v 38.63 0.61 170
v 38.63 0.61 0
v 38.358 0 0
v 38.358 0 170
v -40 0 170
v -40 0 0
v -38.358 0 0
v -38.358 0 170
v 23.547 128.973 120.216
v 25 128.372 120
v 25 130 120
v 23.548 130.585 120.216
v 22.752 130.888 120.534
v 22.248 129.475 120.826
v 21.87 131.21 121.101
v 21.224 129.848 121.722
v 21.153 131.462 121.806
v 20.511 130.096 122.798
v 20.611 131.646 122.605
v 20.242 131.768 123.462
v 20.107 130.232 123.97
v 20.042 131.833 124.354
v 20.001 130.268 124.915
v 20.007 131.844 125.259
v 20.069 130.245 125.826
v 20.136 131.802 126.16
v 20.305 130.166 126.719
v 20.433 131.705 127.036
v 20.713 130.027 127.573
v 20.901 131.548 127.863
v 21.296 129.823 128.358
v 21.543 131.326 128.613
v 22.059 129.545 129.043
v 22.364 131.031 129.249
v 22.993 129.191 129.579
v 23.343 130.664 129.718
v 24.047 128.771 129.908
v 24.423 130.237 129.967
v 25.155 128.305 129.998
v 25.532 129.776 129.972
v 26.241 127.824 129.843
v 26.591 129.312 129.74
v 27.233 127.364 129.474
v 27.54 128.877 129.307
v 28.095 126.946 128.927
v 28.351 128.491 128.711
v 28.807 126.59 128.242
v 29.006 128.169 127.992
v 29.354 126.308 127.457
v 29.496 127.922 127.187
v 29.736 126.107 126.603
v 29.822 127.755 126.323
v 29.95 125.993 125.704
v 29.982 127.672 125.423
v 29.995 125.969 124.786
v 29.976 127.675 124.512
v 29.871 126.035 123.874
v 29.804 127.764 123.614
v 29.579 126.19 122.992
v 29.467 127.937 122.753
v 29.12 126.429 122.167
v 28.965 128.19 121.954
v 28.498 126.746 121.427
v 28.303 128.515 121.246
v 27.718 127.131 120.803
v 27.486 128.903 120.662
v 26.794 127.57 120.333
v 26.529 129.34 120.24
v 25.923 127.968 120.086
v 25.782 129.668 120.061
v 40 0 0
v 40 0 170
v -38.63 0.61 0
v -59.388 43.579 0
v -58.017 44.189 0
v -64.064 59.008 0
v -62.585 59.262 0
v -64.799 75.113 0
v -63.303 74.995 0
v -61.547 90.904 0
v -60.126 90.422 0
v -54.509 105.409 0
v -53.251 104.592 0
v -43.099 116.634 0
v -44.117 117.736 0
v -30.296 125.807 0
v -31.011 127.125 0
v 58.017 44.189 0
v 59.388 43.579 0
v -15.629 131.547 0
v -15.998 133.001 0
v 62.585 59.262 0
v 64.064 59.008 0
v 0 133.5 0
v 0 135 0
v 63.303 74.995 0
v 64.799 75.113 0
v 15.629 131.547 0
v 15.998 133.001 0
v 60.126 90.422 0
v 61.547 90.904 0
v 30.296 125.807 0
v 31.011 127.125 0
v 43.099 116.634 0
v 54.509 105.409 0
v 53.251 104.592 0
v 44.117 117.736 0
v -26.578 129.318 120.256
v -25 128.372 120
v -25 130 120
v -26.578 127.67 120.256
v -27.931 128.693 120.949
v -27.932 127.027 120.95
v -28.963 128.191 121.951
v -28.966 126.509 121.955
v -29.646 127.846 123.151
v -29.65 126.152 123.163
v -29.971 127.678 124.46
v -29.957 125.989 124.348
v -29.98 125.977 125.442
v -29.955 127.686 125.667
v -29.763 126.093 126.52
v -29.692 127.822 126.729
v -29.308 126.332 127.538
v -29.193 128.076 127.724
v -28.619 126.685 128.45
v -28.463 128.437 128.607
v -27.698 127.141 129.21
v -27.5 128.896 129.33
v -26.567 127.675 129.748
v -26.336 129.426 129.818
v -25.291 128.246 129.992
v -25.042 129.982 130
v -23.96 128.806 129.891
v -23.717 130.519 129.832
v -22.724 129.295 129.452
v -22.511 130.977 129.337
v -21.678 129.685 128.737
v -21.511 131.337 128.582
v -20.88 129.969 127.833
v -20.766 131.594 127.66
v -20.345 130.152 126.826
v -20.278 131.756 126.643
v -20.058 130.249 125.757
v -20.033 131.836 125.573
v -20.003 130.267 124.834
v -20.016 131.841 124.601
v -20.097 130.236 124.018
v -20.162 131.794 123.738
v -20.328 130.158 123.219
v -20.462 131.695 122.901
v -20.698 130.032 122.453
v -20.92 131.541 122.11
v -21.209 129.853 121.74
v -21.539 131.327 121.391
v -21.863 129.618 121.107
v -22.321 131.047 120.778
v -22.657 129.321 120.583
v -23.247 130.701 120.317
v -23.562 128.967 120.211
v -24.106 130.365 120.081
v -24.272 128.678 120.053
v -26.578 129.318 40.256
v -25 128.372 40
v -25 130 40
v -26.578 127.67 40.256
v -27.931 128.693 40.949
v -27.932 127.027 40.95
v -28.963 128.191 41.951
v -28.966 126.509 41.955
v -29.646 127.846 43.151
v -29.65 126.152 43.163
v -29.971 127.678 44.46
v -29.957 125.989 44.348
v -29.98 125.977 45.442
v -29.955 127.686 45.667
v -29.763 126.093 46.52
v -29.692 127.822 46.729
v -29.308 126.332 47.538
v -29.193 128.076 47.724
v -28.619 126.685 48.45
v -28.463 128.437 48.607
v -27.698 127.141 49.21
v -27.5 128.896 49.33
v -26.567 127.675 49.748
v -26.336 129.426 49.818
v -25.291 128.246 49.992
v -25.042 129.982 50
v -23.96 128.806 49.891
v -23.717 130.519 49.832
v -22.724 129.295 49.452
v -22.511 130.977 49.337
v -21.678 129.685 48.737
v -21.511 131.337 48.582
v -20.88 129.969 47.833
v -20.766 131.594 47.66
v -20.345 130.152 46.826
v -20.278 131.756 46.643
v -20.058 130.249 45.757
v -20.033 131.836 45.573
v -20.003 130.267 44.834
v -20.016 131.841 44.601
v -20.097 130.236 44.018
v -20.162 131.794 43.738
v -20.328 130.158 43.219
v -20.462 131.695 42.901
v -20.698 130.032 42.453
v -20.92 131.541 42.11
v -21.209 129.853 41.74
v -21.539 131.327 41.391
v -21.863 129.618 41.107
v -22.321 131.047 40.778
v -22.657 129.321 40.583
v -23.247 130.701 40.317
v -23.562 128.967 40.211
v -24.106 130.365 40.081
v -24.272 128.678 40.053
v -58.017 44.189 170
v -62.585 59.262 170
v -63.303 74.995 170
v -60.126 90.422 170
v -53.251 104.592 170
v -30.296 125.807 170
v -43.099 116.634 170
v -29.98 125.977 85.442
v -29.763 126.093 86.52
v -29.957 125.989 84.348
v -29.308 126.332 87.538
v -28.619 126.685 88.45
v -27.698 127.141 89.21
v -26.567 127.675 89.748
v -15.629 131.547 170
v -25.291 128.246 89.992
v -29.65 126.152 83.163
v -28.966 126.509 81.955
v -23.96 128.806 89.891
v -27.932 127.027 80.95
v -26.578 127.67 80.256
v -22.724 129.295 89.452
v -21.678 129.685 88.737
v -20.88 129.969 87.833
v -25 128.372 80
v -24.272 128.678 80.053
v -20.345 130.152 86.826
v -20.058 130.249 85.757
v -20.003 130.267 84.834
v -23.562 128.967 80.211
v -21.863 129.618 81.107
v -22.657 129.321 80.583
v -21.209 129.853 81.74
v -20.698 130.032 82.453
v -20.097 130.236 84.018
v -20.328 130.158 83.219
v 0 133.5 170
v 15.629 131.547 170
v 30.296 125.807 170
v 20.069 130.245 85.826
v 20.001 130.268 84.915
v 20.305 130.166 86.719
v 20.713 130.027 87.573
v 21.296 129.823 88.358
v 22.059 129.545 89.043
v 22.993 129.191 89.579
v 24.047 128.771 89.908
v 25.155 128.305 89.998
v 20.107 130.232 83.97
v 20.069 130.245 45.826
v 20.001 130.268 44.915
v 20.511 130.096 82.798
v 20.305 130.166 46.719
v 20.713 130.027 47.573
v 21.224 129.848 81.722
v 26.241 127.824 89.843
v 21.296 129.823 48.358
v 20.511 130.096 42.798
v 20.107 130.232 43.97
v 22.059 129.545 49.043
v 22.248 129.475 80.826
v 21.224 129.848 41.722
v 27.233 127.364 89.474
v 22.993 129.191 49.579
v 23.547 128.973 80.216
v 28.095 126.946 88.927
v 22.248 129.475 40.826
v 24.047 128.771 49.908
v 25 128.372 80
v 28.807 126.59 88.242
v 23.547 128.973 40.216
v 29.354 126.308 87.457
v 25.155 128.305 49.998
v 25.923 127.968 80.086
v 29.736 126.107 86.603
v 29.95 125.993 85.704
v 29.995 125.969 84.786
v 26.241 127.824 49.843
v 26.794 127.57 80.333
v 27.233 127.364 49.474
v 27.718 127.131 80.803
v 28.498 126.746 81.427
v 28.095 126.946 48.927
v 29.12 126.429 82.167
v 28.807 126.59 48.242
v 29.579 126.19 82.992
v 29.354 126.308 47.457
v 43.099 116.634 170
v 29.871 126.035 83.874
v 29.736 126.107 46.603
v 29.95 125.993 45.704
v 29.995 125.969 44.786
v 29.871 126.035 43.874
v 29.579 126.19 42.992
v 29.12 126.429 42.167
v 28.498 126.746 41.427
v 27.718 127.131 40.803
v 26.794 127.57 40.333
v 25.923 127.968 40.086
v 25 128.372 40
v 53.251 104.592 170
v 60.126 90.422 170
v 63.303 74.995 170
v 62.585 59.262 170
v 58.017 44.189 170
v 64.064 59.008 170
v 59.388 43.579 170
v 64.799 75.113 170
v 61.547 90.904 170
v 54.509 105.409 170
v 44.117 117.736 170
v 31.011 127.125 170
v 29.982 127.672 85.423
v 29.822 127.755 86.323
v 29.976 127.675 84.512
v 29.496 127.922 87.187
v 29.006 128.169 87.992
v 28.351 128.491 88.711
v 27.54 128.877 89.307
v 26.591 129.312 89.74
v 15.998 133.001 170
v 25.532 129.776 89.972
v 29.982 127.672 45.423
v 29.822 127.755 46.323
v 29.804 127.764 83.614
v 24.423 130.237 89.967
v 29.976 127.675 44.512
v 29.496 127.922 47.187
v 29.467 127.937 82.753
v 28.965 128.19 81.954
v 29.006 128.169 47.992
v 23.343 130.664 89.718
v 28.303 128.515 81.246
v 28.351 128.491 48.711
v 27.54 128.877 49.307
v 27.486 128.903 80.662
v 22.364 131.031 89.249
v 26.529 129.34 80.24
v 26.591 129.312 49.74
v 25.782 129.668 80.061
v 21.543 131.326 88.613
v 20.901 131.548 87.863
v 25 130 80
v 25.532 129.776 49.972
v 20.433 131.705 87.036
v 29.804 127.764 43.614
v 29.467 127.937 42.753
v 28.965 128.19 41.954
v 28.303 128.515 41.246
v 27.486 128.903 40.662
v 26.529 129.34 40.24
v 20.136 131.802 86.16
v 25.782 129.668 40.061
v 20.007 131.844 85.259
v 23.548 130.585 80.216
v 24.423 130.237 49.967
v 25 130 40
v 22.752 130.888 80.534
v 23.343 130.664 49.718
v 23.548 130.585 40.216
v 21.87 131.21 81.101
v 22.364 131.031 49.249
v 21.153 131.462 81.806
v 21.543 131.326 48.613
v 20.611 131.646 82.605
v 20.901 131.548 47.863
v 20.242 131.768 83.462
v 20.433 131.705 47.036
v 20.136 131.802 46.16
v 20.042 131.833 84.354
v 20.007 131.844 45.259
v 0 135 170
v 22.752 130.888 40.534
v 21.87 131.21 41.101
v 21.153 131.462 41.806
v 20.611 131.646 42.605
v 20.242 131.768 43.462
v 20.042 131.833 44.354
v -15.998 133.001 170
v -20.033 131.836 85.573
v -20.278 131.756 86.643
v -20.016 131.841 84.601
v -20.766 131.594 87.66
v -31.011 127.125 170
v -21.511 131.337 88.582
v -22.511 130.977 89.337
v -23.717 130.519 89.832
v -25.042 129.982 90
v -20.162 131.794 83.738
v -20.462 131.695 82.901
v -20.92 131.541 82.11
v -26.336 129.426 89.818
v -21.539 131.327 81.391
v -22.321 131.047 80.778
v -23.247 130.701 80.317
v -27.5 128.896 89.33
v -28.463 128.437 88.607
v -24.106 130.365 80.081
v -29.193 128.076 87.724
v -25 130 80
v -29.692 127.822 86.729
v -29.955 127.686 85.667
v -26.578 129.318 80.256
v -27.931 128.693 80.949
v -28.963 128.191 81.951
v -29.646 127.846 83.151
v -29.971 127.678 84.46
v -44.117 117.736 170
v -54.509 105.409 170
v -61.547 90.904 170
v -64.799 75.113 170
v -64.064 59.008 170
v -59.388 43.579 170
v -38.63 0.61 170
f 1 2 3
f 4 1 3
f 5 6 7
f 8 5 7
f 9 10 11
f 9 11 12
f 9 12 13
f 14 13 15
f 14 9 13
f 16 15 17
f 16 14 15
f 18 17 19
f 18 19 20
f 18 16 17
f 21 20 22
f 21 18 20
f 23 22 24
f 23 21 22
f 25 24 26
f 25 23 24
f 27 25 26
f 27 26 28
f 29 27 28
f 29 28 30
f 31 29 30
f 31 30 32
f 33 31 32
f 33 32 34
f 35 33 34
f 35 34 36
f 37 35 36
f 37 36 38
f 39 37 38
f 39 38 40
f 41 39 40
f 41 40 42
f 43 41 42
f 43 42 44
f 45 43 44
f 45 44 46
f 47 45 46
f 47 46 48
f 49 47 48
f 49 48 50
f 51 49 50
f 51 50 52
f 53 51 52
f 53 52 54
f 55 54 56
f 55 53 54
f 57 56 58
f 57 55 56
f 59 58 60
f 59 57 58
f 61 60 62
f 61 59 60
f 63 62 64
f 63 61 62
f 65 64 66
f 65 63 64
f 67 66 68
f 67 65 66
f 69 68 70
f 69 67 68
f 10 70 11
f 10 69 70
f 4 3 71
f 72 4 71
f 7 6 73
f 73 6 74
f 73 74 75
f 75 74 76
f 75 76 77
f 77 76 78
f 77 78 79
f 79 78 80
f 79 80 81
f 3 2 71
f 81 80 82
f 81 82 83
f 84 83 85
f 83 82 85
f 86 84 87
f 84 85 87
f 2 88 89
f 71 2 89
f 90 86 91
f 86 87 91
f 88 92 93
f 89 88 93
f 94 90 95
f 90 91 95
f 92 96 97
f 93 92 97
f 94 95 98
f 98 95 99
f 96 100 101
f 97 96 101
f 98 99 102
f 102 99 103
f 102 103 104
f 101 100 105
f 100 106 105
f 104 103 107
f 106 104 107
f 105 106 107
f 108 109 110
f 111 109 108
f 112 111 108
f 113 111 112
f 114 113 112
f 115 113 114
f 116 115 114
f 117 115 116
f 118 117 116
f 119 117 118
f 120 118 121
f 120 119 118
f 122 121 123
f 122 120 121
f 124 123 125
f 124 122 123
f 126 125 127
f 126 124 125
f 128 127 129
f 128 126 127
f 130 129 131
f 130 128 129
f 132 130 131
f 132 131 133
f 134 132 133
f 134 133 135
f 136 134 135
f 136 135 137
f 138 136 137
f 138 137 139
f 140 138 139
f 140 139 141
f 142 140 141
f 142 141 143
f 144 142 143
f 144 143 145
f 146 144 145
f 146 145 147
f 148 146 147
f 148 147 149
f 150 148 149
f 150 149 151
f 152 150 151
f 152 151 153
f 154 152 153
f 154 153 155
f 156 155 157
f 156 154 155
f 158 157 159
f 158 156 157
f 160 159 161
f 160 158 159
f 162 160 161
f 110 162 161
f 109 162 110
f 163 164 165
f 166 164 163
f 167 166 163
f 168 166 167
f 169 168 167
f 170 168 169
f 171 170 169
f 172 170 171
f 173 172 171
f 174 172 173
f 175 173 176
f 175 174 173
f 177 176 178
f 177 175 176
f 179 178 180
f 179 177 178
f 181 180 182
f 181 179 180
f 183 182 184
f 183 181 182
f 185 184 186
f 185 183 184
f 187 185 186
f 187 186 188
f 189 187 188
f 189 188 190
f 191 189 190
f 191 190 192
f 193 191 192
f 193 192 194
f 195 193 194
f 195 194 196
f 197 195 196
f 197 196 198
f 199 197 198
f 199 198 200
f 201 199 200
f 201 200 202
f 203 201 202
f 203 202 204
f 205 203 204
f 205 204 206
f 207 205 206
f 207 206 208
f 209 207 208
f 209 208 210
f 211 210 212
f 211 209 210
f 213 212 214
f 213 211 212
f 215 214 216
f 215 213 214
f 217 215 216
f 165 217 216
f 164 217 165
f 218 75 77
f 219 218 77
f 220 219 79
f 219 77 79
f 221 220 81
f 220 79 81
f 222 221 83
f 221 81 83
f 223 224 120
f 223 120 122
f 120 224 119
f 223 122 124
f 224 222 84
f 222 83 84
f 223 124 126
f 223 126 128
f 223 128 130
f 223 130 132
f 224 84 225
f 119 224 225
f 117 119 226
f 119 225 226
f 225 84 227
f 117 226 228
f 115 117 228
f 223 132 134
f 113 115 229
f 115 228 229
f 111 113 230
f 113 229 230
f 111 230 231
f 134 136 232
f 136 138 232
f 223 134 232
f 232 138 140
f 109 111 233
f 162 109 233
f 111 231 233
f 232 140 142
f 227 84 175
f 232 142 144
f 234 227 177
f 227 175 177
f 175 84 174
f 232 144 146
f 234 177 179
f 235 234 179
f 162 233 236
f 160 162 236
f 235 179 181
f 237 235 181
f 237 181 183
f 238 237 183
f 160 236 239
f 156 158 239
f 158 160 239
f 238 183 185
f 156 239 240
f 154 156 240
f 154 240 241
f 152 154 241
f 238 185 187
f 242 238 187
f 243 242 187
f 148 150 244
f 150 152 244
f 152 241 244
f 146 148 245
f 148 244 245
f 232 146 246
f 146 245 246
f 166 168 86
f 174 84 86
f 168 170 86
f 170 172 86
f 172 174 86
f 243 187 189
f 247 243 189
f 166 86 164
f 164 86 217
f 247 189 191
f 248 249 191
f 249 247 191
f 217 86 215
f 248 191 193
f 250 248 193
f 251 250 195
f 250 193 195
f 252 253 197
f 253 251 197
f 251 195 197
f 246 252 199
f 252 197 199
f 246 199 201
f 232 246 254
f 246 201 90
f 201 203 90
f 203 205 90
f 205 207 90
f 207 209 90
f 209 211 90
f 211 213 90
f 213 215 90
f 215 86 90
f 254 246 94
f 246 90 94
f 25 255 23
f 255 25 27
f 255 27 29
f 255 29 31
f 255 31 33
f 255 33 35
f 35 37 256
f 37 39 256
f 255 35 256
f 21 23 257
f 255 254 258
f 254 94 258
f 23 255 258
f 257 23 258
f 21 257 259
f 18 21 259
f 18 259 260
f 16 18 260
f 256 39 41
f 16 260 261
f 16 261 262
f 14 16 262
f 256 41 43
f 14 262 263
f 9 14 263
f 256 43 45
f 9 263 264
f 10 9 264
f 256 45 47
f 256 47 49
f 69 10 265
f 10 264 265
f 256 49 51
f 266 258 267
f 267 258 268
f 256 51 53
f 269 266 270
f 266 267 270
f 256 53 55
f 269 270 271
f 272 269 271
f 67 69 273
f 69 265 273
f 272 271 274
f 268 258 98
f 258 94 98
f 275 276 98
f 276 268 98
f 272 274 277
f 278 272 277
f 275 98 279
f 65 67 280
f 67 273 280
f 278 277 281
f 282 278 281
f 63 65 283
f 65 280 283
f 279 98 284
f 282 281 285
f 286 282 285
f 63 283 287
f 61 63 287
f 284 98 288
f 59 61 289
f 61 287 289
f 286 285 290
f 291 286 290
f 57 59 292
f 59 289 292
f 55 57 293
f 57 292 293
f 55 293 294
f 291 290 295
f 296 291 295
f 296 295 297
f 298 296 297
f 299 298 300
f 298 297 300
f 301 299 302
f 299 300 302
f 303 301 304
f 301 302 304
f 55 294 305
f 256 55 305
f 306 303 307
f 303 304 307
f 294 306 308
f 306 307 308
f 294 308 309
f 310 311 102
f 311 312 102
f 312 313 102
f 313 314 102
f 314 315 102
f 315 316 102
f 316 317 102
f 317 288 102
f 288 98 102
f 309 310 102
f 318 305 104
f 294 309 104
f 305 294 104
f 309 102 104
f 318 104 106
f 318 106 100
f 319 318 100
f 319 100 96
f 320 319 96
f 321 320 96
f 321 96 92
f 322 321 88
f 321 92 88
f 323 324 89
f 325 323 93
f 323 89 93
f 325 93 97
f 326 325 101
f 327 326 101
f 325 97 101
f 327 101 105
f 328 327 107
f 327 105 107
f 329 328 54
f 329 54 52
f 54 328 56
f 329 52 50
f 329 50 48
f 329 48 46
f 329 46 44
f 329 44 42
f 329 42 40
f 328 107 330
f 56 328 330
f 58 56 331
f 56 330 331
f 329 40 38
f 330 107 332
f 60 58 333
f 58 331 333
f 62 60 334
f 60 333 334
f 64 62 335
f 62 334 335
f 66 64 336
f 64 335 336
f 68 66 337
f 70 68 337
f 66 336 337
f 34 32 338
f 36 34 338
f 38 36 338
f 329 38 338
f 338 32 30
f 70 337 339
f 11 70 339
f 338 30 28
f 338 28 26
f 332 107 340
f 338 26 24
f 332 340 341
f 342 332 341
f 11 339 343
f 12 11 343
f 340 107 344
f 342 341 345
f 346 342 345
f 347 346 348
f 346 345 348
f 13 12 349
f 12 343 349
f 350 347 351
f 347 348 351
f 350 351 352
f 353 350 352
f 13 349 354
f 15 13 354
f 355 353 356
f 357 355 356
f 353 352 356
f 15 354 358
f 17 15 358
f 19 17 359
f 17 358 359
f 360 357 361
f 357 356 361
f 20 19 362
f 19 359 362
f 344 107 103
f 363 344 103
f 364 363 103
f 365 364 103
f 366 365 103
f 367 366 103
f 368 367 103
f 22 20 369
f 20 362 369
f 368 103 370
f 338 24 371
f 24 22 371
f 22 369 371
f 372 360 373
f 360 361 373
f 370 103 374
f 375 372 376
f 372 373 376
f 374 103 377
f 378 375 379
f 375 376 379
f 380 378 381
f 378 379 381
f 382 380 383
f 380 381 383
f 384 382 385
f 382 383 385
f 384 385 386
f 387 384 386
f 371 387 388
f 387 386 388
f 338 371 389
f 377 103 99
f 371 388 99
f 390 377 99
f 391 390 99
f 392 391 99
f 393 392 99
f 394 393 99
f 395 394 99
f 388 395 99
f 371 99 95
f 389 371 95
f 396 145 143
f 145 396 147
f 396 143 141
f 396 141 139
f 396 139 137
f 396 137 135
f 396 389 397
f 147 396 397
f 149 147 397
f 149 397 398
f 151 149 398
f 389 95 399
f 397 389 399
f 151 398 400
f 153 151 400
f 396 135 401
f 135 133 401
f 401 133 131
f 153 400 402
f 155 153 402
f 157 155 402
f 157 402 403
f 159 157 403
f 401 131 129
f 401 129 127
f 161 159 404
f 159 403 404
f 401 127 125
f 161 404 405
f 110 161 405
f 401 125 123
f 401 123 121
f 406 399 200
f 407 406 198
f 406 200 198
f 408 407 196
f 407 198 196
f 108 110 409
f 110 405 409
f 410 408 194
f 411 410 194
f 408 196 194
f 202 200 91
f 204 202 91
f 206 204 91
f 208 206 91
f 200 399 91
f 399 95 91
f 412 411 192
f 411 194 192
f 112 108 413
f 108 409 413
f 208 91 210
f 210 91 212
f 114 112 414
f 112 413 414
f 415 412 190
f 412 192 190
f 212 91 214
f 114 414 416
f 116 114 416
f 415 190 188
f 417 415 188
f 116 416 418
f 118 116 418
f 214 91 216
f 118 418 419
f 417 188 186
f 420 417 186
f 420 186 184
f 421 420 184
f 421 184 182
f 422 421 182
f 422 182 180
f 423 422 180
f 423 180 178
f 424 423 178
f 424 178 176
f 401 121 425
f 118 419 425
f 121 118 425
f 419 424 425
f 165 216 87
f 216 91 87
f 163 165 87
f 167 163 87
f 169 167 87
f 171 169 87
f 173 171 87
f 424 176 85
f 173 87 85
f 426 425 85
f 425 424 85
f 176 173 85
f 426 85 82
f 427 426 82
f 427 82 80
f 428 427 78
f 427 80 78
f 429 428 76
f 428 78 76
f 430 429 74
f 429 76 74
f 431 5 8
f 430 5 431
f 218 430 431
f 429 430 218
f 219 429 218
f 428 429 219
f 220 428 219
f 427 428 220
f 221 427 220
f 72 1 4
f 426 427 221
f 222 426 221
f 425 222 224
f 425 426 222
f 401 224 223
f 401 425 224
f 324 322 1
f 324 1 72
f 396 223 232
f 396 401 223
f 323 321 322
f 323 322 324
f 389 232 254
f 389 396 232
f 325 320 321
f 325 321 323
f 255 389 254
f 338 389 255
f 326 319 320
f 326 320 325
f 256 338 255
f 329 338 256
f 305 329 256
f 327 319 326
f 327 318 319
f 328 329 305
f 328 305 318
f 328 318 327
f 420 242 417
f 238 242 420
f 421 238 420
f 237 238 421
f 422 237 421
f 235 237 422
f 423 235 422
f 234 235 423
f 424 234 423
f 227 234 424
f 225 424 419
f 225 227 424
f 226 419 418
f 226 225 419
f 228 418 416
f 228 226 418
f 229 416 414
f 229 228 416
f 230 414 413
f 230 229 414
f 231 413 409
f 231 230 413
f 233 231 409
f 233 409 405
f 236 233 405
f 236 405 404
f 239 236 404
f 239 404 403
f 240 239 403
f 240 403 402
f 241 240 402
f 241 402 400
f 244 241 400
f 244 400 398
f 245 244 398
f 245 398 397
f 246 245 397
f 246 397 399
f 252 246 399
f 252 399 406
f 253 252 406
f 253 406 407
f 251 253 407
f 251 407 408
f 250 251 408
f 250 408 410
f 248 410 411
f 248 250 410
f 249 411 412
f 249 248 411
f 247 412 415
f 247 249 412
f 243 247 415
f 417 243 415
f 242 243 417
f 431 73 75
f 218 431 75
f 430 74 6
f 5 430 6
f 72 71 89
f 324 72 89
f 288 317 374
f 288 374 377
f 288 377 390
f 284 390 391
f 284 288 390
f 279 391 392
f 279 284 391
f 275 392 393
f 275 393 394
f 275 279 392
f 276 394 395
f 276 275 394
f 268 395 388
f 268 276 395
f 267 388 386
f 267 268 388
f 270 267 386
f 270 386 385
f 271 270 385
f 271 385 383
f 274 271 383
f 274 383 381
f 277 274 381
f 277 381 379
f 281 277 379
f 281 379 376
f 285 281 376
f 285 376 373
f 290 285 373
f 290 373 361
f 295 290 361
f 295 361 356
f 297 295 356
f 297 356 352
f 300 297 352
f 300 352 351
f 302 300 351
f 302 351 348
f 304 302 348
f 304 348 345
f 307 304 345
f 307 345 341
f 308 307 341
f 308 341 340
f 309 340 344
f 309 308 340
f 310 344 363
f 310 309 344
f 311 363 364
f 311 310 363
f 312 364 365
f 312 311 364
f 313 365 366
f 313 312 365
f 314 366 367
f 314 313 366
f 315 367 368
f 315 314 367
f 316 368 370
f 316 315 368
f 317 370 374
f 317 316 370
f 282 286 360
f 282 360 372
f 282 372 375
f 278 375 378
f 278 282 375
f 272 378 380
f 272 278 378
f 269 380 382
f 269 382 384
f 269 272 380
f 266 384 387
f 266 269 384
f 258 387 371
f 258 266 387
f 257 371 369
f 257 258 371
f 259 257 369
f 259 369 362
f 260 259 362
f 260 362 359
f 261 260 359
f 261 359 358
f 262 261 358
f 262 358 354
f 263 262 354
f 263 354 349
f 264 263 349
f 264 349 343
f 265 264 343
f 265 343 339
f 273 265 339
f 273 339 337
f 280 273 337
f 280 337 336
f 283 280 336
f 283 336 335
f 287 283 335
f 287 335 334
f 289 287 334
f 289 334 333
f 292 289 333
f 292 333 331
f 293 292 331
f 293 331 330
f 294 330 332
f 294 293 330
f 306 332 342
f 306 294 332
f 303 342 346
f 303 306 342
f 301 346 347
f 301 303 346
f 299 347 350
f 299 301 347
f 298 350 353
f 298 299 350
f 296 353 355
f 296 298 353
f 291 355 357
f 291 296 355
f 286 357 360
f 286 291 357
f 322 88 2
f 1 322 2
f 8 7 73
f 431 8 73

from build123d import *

# Parameters (mm, degrees)
BOSS_EXTRUDE1_DEPTH = 170
SKETCH2_R           = 5
CUT_EXTRUDE1_DEPTH  = 196


with BuildPart() as part:
    # Sketch1 → Boss-Extrude1 (new body)
    with BuildSketch(Plane.XY):
        with BuildLine():
            Line((-59.38787205, 43.578784028), (-40, 0))
            Line((-40, 0), (-38.358250656, 0))
            Line((-38.358250656, 0), (-38.629510645, 0.609720369))
            Line((-38.629510645, 0.609720369), (-58.017382695, 44.188504397))
            ThreePointArc((-58.017382695, 44.188504397), (0, 133.5), (58.017382695, 44.188504397))
            Line((58.017382695, 44.188504397), (38.629510645, 0.609720369))
            Line((38.629510645, 0.609720369), (38.358250656, 0))
            Line((38.358250656, 0), (40, 0))
            Line((40, 0), (59.38787205, 43.578784028))
            ThreePointArc((59.38787205, 43.578784028), (0, 135), (-59.38787205, 43.578784028))
        make_face()
    extrude(amount=BOSS_EXTRUDE1_DEPTH)

    # Sketch2 → Cut-Extrude1 (cut, through all)
    with BuildSketch(Plane(origin=(0, 70, 0), x_dir=(1, 0, 0), z_dir=(0, 1, 0))):
        with Locations(Location((-25, -45, 0), (0, 0, 90))):
            Circle(SKETCH2_R)
        with Locations(Location((25, -45, 0), (0, 0, 90))):
            Circle(SKETCH2_R)
        with Locations(Location((25, -85, 0), (0, 0, 90))):
            Circle(SKETCH2_R)
        with Locations(Location((25, -125, 0), (0, 0, 90))):
            Circle(SKETCH2_R)
        with Locations(Location((-25, -85, 0), (0, 0, 90))):
            Circle(SKETCH2_R)
        with Locations(Location((-25, -125, 0), (0, 0, 90))):
            Circle(SKETCH2_R)
    extrude(amount=CUT_EXTRUDE1_DEPTH, mode=Mode.SUBTRACT)


solid = part.part
